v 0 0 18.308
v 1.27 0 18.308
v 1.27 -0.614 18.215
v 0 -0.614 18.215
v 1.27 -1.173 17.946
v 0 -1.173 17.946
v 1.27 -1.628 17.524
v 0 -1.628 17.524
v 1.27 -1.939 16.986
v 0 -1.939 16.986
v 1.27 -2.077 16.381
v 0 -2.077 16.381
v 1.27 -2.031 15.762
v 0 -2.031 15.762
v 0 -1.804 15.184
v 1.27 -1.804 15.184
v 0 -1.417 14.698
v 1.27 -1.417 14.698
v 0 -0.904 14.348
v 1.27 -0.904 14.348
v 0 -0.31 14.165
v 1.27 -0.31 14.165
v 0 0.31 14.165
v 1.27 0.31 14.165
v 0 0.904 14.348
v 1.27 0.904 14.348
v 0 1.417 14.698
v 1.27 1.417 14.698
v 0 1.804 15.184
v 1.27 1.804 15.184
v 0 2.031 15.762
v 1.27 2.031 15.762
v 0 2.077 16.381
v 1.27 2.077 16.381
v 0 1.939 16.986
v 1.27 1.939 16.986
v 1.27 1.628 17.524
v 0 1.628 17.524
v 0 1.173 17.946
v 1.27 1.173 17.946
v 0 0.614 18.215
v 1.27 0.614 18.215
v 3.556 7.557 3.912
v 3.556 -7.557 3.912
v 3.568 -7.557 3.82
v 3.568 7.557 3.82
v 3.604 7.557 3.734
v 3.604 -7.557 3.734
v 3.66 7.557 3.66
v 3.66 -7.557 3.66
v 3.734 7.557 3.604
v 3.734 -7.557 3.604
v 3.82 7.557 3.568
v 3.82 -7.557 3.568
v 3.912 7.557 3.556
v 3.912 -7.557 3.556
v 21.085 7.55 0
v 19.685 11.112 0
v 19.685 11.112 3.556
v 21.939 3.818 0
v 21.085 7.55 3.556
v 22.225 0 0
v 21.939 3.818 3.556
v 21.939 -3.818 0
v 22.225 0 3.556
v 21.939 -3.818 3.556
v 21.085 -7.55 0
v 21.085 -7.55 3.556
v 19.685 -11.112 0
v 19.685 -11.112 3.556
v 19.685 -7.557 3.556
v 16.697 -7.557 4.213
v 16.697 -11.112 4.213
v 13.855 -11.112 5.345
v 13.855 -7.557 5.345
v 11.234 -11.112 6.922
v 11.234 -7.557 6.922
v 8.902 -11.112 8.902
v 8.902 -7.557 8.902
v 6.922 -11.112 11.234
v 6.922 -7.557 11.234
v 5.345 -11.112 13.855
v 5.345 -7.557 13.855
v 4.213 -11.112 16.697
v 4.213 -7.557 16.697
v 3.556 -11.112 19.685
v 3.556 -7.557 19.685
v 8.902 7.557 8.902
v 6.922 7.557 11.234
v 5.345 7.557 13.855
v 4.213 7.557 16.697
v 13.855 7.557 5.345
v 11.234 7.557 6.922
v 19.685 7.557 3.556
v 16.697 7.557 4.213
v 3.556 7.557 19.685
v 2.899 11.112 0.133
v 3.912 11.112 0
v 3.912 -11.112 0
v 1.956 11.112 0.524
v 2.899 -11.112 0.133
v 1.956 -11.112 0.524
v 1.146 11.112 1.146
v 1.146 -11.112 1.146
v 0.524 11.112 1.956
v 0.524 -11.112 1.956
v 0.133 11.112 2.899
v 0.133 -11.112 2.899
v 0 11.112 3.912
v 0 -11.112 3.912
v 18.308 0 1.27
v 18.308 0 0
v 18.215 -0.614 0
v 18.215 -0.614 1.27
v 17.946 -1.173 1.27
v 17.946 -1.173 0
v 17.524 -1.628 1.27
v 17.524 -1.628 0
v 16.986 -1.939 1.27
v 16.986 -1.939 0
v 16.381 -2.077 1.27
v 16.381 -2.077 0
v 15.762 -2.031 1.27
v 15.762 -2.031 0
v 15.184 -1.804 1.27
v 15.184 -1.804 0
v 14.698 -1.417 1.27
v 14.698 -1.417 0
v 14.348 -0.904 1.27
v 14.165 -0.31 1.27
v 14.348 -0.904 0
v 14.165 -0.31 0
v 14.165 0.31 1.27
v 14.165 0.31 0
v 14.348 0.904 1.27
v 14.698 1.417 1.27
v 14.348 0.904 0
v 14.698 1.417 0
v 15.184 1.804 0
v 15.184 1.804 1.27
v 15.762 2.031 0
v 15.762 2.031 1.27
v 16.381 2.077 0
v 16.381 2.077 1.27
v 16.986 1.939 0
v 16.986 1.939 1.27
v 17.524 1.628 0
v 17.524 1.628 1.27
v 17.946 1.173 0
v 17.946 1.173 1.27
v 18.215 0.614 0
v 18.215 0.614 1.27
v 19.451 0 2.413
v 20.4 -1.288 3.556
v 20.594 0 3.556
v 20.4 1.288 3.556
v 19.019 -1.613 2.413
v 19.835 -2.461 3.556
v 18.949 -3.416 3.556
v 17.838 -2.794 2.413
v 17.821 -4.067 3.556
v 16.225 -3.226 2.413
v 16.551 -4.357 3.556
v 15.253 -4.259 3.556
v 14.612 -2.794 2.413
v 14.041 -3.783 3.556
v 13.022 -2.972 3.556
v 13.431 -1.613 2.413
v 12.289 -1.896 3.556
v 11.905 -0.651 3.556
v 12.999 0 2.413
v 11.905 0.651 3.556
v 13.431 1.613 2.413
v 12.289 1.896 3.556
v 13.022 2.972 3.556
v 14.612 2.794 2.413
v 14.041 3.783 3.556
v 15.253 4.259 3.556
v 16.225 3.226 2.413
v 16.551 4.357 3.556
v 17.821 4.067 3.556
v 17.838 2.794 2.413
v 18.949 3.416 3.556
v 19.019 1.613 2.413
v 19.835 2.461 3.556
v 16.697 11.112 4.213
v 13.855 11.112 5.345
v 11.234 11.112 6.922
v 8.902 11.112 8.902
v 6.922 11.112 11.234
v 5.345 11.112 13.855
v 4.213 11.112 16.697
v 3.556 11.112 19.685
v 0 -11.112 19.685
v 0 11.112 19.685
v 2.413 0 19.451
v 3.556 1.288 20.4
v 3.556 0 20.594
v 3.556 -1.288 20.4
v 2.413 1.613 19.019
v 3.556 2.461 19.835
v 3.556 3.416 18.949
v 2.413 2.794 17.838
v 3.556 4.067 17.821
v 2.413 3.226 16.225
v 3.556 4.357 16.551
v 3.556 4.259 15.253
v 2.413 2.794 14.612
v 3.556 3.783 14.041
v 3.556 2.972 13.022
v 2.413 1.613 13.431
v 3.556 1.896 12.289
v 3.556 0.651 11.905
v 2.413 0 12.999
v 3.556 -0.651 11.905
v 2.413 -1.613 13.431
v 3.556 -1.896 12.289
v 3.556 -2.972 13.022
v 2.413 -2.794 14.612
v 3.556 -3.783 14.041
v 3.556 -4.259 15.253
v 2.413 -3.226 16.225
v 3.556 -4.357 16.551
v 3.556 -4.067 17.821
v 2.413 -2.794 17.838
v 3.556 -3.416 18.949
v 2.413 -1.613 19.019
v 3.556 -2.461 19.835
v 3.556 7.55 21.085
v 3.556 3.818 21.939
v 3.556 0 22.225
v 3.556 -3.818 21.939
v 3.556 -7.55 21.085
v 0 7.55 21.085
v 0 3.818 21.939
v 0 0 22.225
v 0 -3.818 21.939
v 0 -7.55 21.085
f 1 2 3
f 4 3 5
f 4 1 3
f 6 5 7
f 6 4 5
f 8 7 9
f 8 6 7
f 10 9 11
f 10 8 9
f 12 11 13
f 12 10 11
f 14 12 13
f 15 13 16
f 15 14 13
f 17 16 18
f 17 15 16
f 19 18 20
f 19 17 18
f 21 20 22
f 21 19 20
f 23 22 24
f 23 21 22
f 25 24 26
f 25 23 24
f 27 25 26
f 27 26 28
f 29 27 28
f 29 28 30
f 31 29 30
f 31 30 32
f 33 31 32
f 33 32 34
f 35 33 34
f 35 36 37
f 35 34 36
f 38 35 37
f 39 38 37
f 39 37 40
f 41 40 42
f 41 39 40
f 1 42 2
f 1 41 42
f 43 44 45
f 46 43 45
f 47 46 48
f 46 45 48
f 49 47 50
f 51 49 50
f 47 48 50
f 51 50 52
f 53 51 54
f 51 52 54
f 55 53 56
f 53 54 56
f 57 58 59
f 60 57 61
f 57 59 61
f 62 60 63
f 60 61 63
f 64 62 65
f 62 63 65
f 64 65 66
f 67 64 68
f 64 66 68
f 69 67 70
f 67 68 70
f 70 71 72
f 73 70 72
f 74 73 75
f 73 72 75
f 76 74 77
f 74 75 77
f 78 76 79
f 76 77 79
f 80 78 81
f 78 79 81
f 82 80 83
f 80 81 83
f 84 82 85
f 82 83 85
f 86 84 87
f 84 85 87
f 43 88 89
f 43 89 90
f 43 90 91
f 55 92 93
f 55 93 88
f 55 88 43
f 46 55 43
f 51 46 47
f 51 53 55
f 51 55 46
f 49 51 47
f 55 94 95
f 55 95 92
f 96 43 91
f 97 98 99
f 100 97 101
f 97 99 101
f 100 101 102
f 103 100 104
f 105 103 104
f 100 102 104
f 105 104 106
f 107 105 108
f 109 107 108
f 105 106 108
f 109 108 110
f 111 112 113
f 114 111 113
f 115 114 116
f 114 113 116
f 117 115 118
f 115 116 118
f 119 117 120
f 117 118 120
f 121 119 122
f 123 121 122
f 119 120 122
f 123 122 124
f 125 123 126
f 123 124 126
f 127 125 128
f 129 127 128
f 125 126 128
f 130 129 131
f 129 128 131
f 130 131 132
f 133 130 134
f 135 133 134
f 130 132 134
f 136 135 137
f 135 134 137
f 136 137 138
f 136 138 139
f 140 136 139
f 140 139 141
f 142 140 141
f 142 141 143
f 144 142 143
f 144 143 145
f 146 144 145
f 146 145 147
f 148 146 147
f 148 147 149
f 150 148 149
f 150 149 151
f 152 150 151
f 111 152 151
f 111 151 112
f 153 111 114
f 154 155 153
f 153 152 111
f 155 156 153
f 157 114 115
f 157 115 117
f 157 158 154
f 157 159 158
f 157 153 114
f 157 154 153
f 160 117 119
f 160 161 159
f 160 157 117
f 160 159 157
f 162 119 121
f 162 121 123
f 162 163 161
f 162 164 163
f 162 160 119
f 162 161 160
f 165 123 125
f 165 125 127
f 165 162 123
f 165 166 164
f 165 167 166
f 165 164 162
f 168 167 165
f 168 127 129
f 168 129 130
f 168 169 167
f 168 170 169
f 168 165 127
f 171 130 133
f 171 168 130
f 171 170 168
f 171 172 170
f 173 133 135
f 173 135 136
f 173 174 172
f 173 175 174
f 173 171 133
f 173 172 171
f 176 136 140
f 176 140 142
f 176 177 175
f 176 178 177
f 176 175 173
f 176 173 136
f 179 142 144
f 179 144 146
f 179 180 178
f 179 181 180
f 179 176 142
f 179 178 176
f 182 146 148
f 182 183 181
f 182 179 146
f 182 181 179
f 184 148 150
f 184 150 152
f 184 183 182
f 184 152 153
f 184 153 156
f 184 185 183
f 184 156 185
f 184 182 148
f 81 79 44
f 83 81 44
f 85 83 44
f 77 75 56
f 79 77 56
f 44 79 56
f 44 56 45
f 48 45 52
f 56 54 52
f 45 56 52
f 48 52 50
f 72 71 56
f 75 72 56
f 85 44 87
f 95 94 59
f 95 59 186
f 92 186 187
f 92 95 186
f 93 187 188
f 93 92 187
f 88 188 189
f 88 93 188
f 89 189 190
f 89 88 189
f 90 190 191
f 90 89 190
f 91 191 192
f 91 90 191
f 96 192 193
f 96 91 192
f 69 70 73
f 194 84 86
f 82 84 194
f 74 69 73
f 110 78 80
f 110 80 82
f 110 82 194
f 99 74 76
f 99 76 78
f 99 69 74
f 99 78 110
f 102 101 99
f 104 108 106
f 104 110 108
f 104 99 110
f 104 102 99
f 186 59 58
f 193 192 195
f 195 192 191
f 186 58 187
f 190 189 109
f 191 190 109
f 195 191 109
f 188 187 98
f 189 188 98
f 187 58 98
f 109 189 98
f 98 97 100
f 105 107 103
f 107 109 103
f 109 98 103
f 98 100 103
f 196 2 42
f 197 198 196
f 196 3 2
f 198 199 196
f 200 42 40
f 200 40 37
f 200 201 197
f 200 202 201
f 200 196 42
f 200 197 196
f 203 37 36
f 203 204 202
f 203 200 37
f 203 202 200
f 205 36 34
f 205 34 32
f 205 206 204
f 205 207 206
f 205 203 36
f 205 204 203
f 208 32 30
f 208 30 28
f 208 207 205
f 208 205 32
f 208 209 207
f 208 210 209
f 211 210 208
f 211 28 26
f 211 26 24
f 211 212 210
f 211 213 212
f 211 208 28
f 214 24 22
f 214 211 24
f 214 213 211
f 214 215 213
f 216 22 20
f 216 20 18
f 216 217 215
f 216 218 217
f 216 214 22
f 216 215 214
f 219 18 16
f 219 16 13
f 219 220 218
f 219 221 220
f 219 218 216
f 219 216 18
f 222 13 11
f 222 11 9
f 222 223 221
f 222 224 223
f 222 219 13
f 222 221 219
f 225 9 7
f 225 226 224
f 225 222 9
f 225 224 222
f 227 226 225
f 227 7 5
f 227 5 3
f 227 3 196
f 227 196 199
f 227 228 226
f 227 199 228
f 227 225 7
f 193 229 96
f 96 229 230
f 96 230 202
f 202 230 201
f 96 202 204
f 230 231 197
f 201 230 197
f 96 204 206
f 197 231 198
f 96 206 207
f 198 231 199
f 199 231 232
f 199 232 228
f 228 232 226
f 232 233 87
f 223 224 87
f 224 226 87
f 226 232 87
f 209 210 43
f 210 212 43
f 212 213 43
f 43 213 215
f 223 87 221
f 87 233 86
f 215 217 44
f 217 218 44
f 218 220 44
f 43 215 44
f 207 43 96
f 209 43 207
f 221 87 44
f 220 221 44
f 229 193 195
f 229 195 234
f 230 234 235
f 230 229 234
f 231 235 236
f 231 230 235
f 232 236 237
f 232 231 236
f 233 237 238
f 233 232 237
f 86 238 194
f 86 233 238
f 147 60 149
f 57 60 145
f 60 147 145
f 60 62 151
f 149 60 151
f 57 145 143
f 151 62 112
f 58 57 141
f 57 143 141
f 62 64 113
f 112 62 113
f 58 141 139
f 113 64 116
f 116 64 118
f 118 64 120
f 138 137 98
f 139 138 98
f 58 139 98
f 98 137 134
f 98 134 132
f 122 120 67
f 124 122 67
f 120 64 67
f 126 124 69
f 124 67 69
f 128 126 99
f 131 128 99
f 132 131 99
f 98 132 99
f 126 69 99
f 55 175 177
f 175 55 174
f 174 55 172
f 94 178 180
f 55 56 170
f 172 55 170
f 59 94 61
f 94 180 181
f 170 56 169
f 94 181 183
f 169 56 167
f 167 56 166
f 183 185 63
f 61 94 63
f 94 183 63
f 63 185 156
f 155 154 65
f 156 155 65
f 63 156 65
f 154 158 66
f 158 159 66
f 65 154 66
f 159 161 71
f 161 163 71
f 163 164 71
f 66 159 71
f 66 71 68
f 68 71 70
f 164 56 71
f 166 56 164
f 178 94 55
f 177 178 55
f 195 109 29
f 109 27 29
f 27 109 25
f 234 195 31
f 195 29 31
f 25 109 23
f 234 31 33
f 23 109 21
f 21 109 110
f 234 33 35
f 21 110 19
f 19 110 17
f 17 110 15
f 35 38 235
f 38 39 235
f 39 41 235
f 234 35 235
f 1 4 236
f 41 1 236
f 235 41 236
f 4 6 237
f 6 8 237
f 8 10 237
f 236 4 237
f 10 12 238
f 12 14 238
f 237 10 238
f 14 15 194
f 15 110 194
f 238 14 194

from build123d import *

# Parameters (mm, degrees)
EXTRUDE_THIN1_START = -11.1125
EXTRUDE_THIN1_DEPTH = 22.225
EXTRUDE4_START      = -3.556
EXTRUDE4_DEPTH      = 3.556
SKETCH4_R           = 2.0828
CUT_EXTRUDE1_DEPTH  = 34.3375
CUT_EXTRUDE2_DEPTH  = 32.080055377
CHAMFER1_SIZE       = 2.286


# Read off the part's stored shape, not the designer's step: Extrude-Thin1
with BuildPart() as part:
    # Extrude-Thin1 outline → Extrude-Thin1 (new body)
    with BuildSketch(Plane(origin=(0, 0, 0), x_dir=(1, 0, 0), z_dir=(0, 1, 0)).offset(EXTRUDE_THIN1_START)):
        with BuildLine():
            Line((3.9116, -3.556), (22.225, -3.556))
            Line((22.225, -3.556), (22.225, 0))
            Line((22.225, 0), (3.9116, 0))
            ThreePointArc((3.9116, 0), (1.145681115, -1.145681115), (0, -3.9116))
            Line((0, -3.9116), (0, -22.225))
            Line((0, -22.225), (3.556, -22.225))
            Line((3.556, -22.225), (3.556, -3.9116))
            ThreePointArc((3.556, -3.9116), (3.660152829, -3.660152829), (3.9116, -3.556))
        make_face()
    extrude(amount=EXTRUDE_THIN1_DEPTH)

    # Sketch5 → Extrude4 (add)
    with BuildSketch(Plane(origin=(0, 11.1125, 0), x_dir=(1, 0, 0), z_dir=(0, 1, 0)).offset(EXTRUDE4_START)):
        with BuildLine():
            Line((3.9116, -3.556), (19.685, -3.556))
            ThreePointArc((19.685, -3.556), (8.902403387, -8.902403387), (3.556, -19.685))
            Line((3.556, -19.685), (3.556, -3.9116))
            ThreePointArc((3.556, -3.9116), (3.660152829, -3.660152829), (3.9116, -3.556))
        make_face()
    extrude4 = extrude(amount=EXTRUDE4_DEPTH)

    # Mirror2: Extrude4 across plane
    add(extrude4.mirror(Plane.ZX))

    # Sketch4 → Cut-Extrude1 (cut, through all)
    with BuildSketch(Plane(origin=(0, 0, 0), x_dir=(0, 0, -1), z_dir=(1, 0, 0))):
        with Locations(Location((-16.225, 0, 0), (0, 0, 180))):
            Circle(SKETCH4_R)
    cut_extrude1 = extrude(amount=CUT_EXTRUDE1_DEPTH, mode=Mode.SUBTRACT)

    # Sketch6 → Cut-Extrude2 (cut, symmetric)
    with BuildSketch(Plane(origin=(3.556, 0, 0), x_dir=(0, 0, -1), z_dir=(1, 0, 0))):
        with BuildLine():
            Line((10.456138589, 73.60153911), (-19.685, 11.1125))
            ThreePointArc((-19.685, 11.1125), (-22.225, 0), (-19.685, -11.1125))
            Line((-19.685, -11.1125), (10.456138589, -73.60153911))
            Line((10.456138589, -73.60153911), (-128.300745843, -73.60153911))
            Line((-128.300745843, -73.60153911), (-128.300745843, 73.60153911))
            Line((-128.300745843, 73.60153911), (10.456138589, 73.60153911))
        make_face()
    cut_extrude2 = extrude(amount=CUT_EXTRUDE2_DEPTH, both=True, mode=Mode.SUBTRACT)

    # Mirror3: Cut-Extrude1, Cut-Extrude2 across plane
    add(cut_extrude1.mirror(Plane(origin=(0, 0, 0), x_dir=(0.7071067811865465, 0, 0.7071067811865486), z_dir=(-0.7071067811865488, 0, 0.7071067811865464))), mode=Mode.SUBTRACT)
    add(cut_extrude2.mirror(Plane(origin=(0, 0, 0), x_dir=(0.7071067811865465, 0, 0.7071067811865486), z_dir=(-0.7071067811865488, 0, 0.7071067811865464))), mode=Mode.SUBTRACT)

    # Chamfer1
    chamfer1_edges = [part.edges().sort_by_distance(p)[0] for p in [
        (3.556, 0, 14.1422),
        (14.1422, 0, 3.556),
    ]]
    chamfer(chamfer1_edges, length=CHAMFER1_SIZE)


solid = part.part
